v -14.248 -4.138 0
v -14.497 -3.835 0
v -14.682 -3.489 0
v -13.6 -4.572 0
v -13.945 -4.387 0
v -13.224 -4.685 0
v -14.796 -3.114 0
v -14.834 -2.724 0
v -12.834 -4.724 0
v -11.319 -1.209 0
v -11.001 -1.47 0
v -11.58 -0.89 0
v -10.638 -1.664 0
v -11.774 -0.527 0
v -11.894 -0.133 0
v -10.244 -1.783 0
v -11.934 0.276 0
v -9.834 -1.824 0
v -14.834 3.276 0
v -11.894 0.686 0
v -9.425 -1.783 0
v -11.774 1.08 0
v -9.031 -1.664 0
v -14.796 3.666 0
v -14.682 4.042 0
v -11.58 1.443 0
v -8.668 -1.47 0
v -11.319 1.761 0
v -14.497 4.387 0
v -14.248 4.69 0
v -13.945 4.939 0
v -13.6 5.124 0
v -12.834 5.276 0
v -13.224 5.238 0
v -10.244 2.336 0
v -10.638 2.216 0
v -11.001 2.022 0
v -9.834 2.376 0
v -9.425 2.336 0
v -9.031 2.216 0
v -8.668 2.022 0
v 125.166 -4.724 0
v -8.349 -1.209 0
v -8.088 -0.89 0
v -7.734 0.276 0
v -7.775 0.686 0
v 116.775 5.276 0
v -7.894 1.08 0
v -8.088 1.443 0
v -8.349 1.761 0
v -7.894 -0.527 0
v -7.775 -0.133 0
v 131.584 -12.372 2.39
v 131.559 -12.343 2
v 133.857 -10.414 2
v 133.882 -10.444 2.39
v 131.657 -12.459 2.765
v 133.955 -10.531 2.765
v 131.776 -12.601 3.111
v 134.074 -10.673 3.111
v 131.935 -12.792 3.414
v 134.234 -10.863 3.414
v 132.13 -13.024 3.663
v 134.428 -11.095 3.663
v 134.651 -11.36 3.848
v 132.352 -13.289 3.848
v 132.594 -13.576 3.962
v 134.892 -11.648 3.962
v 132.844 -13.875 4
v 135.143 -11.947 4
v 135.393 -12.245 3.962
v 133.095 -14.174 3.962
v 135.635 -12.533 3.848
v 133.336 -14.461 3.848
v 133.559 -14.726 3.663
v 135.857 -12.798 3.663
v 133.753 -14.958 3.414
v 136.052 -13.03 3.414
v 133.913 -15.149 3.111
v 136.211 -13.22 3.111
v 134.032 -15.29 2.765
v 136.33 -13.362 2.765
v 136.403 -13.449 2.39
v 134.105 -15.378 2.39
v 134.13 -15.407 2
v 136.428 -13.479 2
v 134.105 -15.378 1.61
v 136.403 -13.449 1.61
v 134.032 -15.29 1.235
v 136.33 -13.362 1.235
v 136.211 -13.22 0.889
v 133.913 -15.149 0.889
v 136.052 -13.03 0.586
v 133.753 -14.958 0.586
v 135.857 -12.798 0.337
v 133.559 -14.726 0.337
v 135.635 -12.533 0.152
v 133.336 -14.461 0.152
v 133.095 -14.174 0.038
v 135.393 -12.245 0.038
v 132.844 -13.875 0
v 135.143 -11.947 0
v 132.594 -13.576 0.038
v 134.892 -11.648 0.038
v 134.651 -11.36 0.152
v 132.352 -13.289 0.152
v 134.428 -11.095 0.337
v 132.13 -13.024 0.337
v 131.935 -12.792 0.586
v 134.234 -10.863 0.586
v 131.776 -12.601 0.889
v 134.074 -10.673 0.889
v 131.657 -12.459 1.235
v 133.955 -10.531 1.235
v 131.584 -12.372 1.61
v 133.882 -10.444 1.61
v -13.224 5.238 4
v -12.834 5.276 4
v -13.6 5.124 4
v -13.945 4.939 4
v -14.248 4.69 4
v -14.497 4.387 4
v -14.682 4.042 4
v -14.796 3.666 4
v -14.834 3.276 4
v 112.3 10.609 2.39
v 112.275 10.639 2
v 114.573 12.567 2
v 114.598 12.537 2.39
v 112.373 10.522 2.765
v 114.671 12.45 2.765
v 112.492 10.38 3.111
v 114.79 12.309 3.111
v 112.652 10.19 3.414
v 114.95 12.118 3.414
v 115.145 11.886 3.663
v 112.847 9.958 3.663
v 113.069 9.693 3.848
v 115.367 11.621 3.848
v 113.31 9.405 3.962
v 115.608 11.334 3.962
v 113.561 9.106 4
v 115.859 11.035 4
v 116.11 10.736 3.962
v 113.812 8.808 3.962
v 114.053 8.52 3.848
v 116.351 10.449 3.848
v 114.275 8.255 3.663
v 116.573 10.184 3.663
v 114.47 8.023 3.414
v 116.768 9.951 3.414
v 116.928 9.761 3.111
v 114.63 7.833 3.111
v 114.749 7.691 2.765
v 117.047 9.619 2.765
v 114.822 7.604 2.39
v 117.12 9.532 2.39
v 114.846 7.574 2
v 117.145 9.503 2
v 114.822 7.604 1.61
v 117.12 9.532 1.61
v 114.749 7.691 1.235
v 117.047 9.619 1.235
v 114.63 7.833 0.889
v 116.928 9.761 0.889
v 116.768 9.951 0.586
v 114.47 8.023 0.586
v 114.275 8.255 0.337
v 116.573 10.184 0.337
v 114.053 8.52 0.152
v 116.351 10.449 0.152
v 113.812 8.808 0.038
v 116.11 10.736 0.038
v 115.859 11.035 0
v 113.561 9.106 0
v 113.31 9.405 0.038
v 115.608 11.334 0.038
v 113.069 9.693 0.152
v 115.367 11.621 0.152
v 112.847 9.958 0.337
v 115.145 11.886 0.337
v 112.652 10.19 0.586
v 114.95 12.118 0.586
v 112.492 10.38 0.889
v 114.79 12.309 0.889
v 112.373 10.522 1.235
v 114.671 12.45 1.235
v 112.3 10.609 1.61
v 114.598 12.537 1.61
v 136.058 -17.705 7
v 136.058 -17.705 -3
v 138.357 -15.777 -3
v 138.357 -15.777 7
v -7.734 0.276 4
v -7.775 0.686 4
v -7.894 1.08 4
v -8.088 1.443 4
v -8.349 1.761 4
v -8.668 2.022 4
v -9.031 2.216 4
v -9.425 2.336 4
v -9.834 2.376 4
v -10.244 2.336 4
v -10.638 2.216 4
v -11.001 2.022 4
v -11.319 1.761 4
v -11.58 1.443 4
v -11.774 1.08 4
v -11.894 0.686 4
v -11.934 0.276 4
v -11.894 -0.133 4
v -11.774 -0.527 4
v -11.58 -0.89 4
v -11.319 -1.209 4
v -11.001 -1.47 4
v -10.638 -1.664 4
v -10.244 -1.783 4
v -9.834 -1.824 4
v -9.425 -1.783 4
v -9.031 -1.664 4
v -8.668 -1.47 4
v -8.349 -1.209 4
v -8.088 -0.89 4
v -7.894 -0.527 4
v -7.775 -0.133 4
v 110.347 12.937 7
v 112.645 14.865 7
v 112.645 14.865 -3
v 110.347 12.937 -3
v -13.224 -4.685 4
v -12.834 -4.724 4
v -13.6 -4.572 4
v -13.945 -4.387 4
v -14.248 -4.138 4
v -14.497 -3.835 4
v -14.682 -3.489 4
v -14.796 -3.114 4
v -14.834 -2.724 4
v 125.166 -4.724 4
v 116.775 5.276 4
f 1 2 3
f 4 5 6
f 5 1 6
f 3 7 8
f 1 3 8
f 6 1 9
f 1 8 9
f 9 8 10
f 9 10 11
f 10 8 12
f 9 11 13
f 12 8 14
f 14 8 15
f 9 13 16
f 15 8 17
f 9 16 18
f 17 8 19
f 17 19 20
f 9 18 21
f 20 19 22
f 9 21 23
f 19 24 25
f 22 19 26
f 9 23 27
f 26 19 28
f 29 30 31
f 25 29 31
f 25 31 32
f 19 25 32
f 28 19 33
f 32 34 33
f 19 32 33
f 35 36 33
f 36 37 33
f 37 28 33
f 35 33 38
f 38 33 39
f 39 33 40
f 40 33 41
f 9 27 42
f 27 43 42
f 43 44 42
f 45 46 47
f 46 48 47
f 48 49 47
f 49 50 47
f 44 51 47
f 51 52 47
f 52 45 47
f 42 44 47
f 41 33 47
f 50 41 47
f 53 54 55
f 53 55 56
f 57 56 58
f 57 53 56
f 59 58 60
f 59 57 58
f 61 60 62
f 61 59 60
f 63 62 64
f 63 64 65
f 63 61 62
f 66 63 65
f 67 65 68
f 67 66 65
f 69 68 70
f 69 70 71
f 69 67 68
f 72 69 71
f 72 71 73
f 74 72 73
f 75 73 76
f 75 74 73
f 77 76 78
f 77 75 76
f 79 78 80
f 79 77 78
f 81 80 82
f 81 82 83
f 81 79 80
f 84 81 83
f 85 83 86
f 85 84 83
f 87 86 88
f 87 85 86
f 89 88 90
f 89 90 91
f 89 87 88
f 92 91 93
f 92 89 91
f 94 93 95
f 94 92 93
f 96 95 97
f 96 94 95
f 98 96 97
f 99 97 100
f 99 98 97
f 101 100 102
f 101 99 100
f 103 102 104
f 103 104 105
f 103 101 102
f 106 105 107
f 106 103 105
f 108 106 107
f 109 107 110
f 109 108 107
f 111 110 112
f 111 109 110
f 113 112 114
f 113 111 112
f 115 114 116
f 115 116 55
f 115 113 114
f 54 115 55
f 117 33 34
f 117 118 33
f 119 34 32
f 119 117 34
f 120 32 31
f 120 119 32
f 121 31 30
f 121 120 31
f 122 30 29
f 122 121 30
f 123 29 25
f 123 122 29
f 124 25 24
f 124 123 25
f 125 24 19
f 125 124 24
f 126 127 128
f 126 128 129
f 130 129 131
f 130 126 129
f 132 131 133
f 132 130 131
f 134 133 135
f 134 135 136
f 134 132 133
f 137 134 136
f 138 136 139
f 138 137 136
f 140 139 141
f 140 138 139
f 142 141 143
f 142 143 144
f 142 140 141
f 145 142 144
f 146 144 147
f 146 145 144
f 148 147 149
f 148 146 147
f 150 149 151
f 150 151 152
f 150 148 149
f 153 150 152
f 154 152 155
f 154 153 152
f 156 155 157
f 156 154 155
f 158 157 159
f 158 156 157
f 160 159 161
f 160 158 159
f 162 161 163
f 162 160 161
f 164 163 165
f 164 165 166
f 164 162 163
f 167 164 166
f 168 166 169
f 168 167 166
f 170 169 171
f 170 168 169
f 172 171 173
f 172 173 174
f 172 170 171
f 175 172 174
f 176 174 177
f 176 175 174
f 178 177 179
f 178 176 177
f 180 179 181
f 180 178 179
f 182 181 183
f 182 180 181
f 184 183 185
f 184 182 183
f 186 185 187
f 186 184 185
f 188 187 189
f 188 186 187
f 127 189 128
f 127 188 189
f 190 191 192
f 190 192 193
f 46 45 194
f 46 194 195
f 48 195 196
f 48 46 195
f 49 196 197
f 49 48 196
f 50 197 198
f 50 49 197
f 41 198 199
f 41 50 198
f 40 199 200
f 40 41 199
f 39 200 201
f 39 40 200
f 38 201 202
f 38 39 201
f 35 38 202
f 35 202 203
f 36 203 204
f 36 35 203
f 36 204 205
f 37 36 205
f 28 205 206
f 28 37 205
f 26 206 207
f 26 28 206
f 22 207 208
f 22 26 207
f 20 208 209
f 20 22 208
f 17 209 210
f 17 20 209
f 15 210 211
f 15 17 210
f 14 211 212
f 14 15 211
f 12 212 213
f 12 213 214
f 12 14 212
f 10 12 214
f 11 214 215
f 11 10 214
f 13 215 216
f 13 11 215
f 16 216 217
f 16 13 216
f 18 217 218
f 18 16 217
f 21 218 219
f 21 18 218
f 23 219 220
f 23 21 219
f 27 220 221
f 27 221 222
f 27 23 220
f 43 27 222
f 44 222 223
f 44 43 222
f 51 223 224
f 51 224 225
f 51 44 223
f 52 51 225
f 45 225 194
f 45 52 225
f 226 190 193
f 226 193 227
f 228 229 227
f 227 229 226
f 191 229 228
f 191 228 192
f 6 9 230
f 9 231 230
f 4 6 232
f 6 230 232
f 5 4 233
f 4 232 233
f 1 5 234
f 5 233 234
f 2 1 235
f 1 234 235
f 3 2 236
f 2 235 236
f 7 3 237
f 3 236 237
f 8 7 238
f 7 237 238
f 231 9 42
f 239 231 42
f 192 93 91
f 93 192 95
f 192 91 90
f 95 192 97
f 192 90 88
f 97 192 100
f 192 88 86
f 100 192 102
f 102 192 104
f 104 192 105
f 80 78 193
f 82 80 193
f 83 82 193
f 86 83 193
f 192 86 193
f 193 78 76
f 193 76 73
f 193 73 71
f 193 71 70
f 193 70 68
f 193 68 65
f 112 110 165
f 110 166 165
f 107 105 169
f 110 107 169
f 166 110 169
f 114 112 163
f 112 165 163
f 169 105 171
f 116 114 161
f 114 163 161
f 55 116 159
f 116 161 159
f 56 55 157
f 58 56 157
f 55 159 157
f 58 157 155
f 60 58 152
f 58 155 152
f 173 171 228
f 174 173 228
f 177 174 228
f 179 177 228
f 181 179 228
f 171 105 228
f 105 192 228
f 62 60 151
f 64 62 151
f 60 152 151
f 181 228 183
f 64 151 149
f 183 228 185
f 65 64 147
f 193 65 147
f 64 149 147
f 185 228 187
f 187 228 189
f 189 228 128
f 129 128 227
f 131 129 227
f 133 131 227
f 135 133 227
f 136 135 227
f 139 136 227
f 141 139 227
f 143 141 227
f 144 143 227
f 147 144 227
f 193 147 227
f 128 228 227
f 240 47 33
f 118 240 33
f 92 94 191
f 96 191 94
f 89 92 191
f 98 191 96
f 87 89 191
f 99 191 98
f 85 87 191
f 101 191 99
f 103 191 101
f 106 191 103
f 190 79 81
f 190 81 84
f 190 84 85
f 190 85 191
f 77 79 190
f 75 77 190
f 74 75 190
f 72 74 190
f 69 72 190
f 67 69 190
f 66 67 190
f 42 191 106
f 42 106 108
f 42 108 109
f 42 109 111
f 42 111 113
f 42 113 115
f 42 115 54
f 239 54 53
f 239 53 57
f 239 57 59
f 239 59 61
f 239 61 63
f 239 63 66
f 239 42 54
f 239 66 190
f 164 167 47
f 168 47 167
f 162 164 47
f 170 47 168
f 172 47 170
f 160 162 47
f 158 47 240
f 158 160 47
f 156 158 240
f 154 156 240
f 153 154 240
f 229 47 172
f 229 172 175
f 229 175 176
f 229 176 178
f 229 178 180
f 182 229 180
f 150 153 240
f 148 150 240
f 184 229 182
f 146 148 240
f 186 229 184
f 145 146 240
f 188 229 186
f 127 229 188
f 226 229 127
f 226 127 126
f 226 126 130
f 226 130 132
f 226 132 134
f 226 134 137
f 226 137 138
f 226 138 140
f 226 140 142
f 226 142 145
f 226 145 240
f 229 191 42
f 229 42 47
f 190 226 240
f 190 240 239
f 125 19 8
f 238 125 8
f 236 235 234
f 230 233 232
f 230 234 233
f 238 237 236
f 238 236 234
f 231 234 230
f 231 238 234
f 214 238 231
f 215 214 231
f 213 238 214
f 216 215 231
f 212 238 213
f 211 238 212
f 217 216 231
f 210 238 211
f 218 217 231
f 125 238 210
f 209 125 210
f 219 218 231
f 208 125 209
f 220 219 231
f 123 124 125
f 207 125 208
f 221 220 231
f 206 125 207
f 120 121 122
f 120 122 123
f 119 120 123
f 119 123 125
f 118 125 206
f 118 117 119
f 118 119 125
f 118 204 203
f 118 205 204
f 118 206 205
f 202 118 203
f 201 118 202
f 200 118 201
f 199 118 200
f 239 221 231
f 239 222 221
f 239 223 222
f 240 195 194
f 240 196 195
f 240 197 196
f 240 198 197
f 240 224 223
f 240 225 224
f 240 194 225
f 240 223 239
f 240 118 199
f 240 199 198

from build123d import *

# Parameters (mm, degrees)
SKETCH_1_R      = 2.1
EXTRUDE_1_DEPTH = 4
FILLET_1_R      = 2
SKETCH_2_R      = 2
EXTRUDE_2_DEPTH = 3


with BuildPart() as part:
    # 草图1 → 凸台-拉伸1 (new body)
    with BuildSketch(Plane.XY):
        Polygon((125.165745856, -4.723756906), (116.774749545, 5.276243094), (-14.834254144, 5.276243094), (-14.834254144, -4.723756906), align=None)
        with Locations((-9.834254144, 0.276243094)):
            Circle(SKETCH_1_R, mode=Mode.SUBTRACT)
    extrude(amount=EXTRUDE_1_DEPTH)

    # 圆角1
    fillet_1_edges = [part.edges().sort_by_distance(p)[0] for p in [
        (-14.834254144, 5.276243094, 2),
        (-14.834254144, -4.723756906, 2),
    ]]
    fillet(fillet_1_edges, radius=FILLET_1_R)

    # 草图2 → 凸台-拉伸2 (add)
    with BuildSketch(Plane(origin=(71.124278553, 59.680355902, 0), x_dir=(0, 0, -1), z_dir=(0.7660444431189745, 0.6427876096865437, 0))):
        Polygon((-4, -61.019525429), (3, -61.019525429), (3, -101.019525429), (-7, -101.019525429), (-7, -61.019525429), align=None)
        with Locations(Location((-2, -66.019525429, 0), (0, 0, 90))):
            Circle(SKETCH_2_R, mode=Mode.SUBTRACT)
        with Locations(Location((-2, -96.019525429, 0), (0, 0, 90))):
            Circle(SKETCH_2_R, mode=Mode.SUBTRACT)
    extrude(amount=EXTRUDE_2_DEPTH)


solid = part.part
